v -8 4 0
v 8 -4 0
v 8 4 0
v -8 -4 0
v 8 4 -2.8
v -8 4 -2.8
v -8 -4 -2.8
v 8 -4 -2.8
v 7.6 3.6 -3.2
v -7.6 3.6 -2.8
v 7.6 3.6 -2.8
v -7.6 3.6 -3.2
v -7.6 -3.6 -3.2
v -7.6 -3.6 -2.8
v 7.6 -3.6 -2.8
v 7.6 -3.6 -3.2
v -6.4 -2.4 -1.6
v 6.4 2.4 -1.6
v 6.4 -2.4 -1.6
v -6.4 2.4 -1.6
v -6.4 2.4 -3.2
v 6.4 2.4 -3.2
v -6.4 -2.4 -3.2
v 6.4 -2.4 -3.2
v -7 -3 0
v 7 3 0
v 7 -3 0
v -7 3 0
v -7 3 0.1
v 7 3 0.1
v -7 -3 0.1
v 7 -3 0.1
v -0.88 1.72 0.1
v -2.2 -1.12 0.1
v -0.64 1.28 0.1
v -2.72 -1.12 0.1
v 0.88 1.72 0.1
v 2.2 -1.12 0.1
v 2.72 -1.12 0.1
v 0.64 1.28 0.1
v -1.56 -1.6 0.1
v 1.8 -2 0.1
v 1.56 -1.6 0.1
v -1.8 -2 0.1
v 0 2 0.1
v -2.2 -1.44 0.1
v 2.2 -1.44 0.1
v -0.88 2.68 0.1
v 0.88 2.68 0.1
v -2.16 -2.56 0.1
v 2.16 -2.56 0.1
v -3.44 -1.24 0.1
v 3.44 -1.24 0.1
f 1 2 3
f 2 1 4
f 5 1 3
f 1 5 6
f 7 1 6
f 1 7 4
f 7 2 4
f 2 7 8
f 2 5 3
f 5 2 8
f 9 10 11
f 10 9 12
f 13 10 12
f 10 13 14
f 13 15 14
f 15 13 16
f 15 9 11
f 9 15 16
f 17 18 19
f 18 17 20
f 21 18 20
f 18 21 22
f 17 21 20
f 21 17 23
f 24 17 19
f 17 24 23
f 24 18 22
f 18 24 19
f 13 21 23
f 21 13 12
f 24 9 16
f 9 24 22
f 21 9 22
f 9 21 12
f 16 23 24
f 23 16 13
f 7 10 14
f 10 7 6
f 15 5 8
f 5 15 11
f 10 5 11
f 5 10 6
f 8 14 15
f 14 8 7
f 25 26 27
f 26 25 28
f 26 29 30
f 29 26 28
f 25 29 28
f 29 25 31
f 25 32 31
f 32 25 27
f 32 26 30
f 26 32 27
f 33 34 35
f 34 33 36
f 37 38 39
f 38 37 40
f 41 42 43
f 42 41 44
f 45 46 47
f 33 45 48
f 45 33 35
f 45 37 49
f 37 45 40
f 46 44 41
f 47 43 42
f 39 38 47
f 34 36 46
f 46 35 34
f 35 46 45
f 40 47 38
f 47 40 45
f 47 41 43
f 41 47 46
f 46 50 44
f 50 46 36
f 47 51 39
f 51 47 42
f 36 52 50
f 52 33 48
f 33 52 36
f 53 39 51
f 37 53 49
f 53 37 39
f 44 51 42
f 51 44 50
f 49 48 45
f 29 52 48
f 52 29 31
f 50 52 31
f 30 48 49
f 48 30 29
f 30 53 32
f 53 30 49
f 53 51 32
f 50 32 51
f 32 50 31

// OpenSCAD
// file: ../p/box5.scad
use <../lib.scad>
function ldraw_lib__box5() = [
// 0 Box with 5 Faces and All Edges
// 0 Name: box5.dat
// 0 Author: James Jessiman
// 0 !LDRAW_ORG Primitive UPDATE 2012-01
// 0 !LICENSE Licensed under CC BY 4.0 : see CAreadme.txt
// 
// 0 BFC CERTIFY CCW
  [0,"BFC","CERTIFY"],
  [0,"BFC","CCW"],
// 
// 0 !HISTORY 2002-04-03 [sbliss] Modified for BFC compliance
// 0 !HISTORY 2002-04-25 [PTadmin] Official Update 2002-02
// 0 !HISTORY 2007-06-24 [PTadmin] Header formatted for Contributor Agreement
// 0 !HISTORY 2008-07-01 [PTadmin] Official Update 2008-01
// 0 !HISTORY 2012-02-16 [Philo] Changed to CCW
// 0 !HISTORY 2012-03-30 [PTadmin] Official Update 2012-01
// 
// 
// 2 24 1 1 1 -1 1 1
  [2,24,1,1,1,-1,1,1],
// 2 24 -1 1 1 -1 1 -1
  [2,24,-1,1,1,-1,1,-1],
// 2 24 -1 1 -1 1 1 -1
  [2,24,-1,1,-1,1,1,-1],
// 2 24 1 1 -1 1 1 1
  [2,24,1,1,-1,1,1,1],
// 2 24 1 0 1 -1 0 1
  [2,24,1,0,1,-1,0,1],
// 2 24 -1 0 1 -1 0 -1
  [2,24,-1,0,1,-1,0,-1],
// 2 24 -1 0 -1 1 0 -1
  [2,24,-1,0,-1,1,0,-1],
// 2 24 1 0 -1 1 0 1
  [2,24,1,0,-1,1,0,1],
// 2 24 1 0 1 1 1 1
  [2,24,1,0,1,1,1,1],
// 2 24 -1 0 1 -1 1 1
  [2,24,-1,0,1,-1,1,1],
// 2 24 1 0 -1 1 1 -1
  [2,24,1,0,-1,1,1,-1],
// 2 24 -1 0 -1 -1 1 -1
  [2,24,-1,0,-1,-1,1,-1],
// 4 16 -1 1 1 1 1 1 1 1 -1 -1 1 -1
  [4,16,-1,1,1,1,1,1,1,1,-1,-1,1,-1],
// 4 16 -1 1 1 -1 0 1 1 0 1 1 1 1
  [4,16,-1,1,1,-1,0,1,1,0,1,1,1,1],
// 4 16 -1 1 -1 -1 0 -1 -1 0 1 -1 1 1
  [4,16,-1,1,-1,-1,0,-1,-1,0,1,-1,1,1],
// 4 16 1 1 -1 1 0 -1 -1 0 -1 -1 1 -1
  [4,16,1,1,-1,1,0,-1,-1,0,-1,-1,1,-1],
// 4 16 1 1 1 1 0 1 1 0 -1 1 1 -1
  [4,16,1,1,1,1,0,1,1,0,-1,1,1,-1],
];
module ldraw_lib__box5(step=0, col=false, unit=2/5, alt=false, line=0.2, solid=!$preview)
    makepoly(ldraw_lib__box5(), step=step, col=col, unit=unit, alt=alt, line=line, solid=solid);
ldraw_lib__box5(line=0.2);
// file: ../p/box4.scad
use <../lib.scad>
function ldraw_lib__box4() = [
// 0 Box with 4 Faces (2 Parallel Pairs) and All Edges
// 0 Name: box4.dat
// 0 Author: James Jessiman
// 0 !LDRAW_ORG Primitive UPDATE 2012-01
// 0 !LICENSE Licensed under CC BY 4.0 : see CAreadme.txt
// 
// 0 BFC CERTIFY CCW
  [0,"BFC","CERTIFY"],
  [0,"BFC","CCW"],
// 
// 0 !HISTORY 2002-04-03 [sbliss] Modified for BFC compliance
// 0 !HISTORY 2002-04-25 [PTadmin] Official Update 2002-02
// 0 !HISTORY 2007-06-24 [PTadmin] Header formatted for Contributor Agreement
// 0 !HISTORY 2008-07-01 [PTadmin] Official Update 2008-01
// 0 !HISTORY 2012-02-16 [Philo] Changed to CCW
// 0 !HISTORY 2012-03-30 [PTadmin] Official Update 2012-01
// 
// 
// 2 24 1 1 1 -1 1 1
  [2,24,1,1,1,-1,1,1],
// 2 24 -1 1 1 -1 1 -1
  [2,24,-1,1,1,-1,1,-1],
// 2 24 -1 1 -1 1 1 -1
  [2,24,-1,1,-1,1,1,-1],
// 2 24 1 1 -1 1 1 1
  [2,24,1,1,-1,1,1,1],
// 2 24 1 0 1 -1 0 1
  [2,24,1,0,1,-1,0,1],
// 2 24 -1 0 1 -1 0 -1
  [2,24,-1,0,1,-1,0,-1],
// 2 24 -1 0 -1 1 0 -1
  [2,24,-1,0,-1,1,0,-1],
// 2 24 1 0 -1 1 0 1
  [2,24,1,0,-1,1,0,1],
// 2 24 1 0 1 1 1 1
  [2,24,1,0,1,1,1,1],
// 2 24 -1 0 1 -1 1 1
  [2,24,-1,0,1,-1,1,1],
// 2 24 1 0 -1 1 1 -1
  [2,24,1,0,-1,1,1,-1],
// 2 24 -1 0 -1 -1 1 -1
  [2,24,-1,0,-1,-1,1,-1],
// 4 16 -1 1 1 -1 0 1 1 0 1 1 1 1
  [4,16,-1,1,1,-1,0,1,1,0,1,1,1,1],
// 4 16 -1 1 -1 -1 0 -1 -1 0 1 -1 1 1
  [4,16,-1,1,-1,-1,0,-1,-1,0,1,-1,1,1],
// 4 16 1 1 -1 1 0 -1 -1 0 -1 -1 1 -1
  [4,16,1,1,-1,1,0,-1,-1,0,-1,-1,1,-1],
// 4 16 1 1 1 1 0 1 1 0 -1 1 1 -1
  [4,16,1,1,1,1,0,1,1,0,-1,1,1,-1],
];
module ldraw_lib__box4(step=0, col=false, unit=2/5, alt=false, line=0.2, solid=!$preview)
    makepoly(ldraw_lib__box4(), step=step, col=col, unit=unit, alt=alt, line=line, solid=solid);
ldraw_lib__box4(line=0.2);
// file: ../p/box5-12.scad
use <../lib.scad>
function ldraw_lib__box5_12() = [
// 0 Box with 5 Faces without Any Edges
// 0 Name: box5-12.dat
// 0 Author: Chris Dee [cwdee]
// 0 !LDRAW_ORG Primitive UPDATE 2009-02
// 0 !LICENSE Licensed under CC BY 4.0 : see CAreadme.txt
// 
// 0 BFC CERTIFY CCW
  [0,"BFC","CERTIFY"],
  [0,"BFC","CCW"],
// 
// 0 !HISTORY 2009-09-03 [PTadmin] Official Update 2009-02
// 
// 
// 4 16 1 1 1 1 1 -1 -1 1 -1 -1 1 1
  [4,16,1,1,1,1,1,-1,-1,1,-1,-1,1,1],
// 4 16 -1 0 1 1 0 1 1 1 1 -1 1 1
  [4,16,-1,0,1,1,0,1,1,1,1,-1,1,1],
// 4 16 -1 0 -1 -1 0 1 -1 1 1 -1 1 -1
  [4,16,-1,0,-1,-1,0,1,-1,1,1,-1,1,-1],
// 4 16 1 0 -1 -1 0 -1 -1 1 -1 1 1 -1
  [4,16,1,0,-1,-1,0,-1,-1,1,-1,1,1,-1],
// 4 16 1 0 1 1 0 -1 1 1 -1 1 1 1
  [4,16,1,0,1,1,0,-1,1,1,-1,1,1,1],
// 0
];
module ldraw_lib__box5_12(step=0, col=false, unit=2/5, alt=false, line=0.2, solid=!$preview)
    makepoly(ldraw_lib__box5_12(), step=step, col=col, unit=unit, alt=alt, line=line, solid=solid);
ldraw_lib__box5_12(line=0.2);
// file: s/3069bs01.scad
use <../../lib.scad>
use <../../p/box4.scad>
use <../../p/box5.scad>
function ldraw_lib__s__3069bs01() = [
// 0 ~Tile  1 x  2 with Groove without Top Face
// 0 Name: s\3069bs01.dat
// 0 Author: Santeri Piippo [arezey]
// 0 !LDRAW_ORG Subpart UPDATE 2010-02
// 0 !LICENSE Licensed under CC BY 4.0 : see CAreadme.txt
// 
// 0 BFC CERTIFY CCW
  [0,"BFC","CERTIFY"],
  [0,"BFC","CCW"],
// 
// 0 !HISTORY 2010-07-05 [PTadmin] Official Update 2010-02
// 
// 
// 1 16 0 0 0 20 0 0 0 7 0 0 0 10 box4.dat
  [1,16,0,0,0,20,0,0,0,7,0,0,0,10, ldraw_lib__box4()],
// 1 16 0 7 0 19 0 0 0 1 0 0 0 9 box4.dat
  [1,16,0,7,0,19,0,0,0,1,0,0,0,9, ldraw_lib__box4()],
// 0 BFC INVERTNEXT
  [0,"BFC","INVERTNEXT"],
// 1 16 0 8 0 16 0 0 0 -4 0 0 0 6 box5.dat
  [1,16,0,8,0,16,0,0,0,-4,0,0,0,6, ldraw_lib__box5()],
// 4 16 -19 8 9 -16 8 6 -16 8 -6 -19 8 -9
  [4,16,-19,8,9,-16,8,6,-16,8,-6,-19,8,-9],
// 4 16 19 8 -9 16 8 -6 16 8 6 19 8 9
  [4,16,19,8,-9,16,8,-6,16,8,6,19,8,9],
// 4 16 19 8 9 16 8 6 -16 8 6 -19 8 9
  [4,16,19,8,9,16,8,6,-16,8,6,-19,8,9],
// 4 16 -19 8 -9 -16 8 -6 16 8 -6 19 8 -9
  [4,16,-19,8,-9,-16,8,-6,16,8,-6,19,8,-9],
// 4 16 -20 7 10 -19 7 9 -19 7 -9 -20 7 -10
  [4,16,-20,7,10,-19,7,9,-19,7,-9,-20,7,-10],
// 4 16 20 7 -10 19 7 -9 19 7 9 20 7 10
  [4,16,20,7,-10,19,7,-9,19,7,9,20,7,10],
// 4 16 20 7 10 19 7 9 -19 7 9 -20 7 10
  [4,16,20,7,10,19,7,9,-19,7,9,-20,7,10],
// 4 16 -20 7 -10 -19 7 -9 19 7 -9 20 7 -10
  [4,16,-20,7,-10,-19,7,-9,19,7,-9,20,7,-10],
// 0 //
];
module ldraw_lib__s__3069bs01(step=0, col=false, unit=2/5, alt=false, line=0.2, solid=!$preview)
    makepoly(ldraw_lib__s__3069bs01(), step=step, col=col, unit=unit, alt=alt, line=line, solid=solid);
ldraw_lib__s__3069bs01(line=0.2);
// file: 6299663b.scad
use <../lib.scad>
use <../p/box5-12.scad>
function ldraw_lib__6299663b() = [
// 0 Sticker  0.7 x  1.7 with Red and White Triangle on Dark Red Background
// 0 Name: 6299663b.dat
// 0 Author: Evert-Jan Boer [ejboer]
// 0 !LDRAW_ORG Part UPDATE 2020-03
// 0 !LICENSE Licensed under CC BY 4.0 : see CAreadme.txt
// 
// 0 BFC CERTIFY CCW
  [0,"BFC","CERTIFY"],
  [0,"BFC","CCW"],
// 
// 0 !KEYWORDS A-wing Starfighter UCS, Set 75275
// 
// 0 !HISTORY 2020-12-29 [PTadmin] Official Update 2020-03
// 
// 
// 1 16 0 -0.25 0 17.5 0 0 0 0.25 0 0 0 7.5 box5-12.dat
  [1,16,0,-0.25,0,17.5,0,0,0,0.25,0,0,0,7.5, ldraw_lib__box5_12()],
// 
// 4 4 -6.8 -0.25 -2.8 -5.5 -0.25 -2.8 -1.6 -0.25 3.2 -2.2 -0.25 4.3
  [4,4,-6.8,-0.25,-2.8,-5.5,-0.25,-2.8,-1.6,-0.25,3.2,-2.2,-0.25,4.3],
// 4 4 1.6 -0.25 3.2 5.5 -0.25 -2.8 6.8 -0.25 -2.8 2.2 -0.25 4.3
  [4,4,1.6,-0.25,3.2,5.5,-0.25,-2.8,6.8,-0.25,-2.8,2.2,-0.25,4.3],
// 4 4 -3.9 -0.25 -4 -4.5 -0.25 -5 4.5 -0.25 -5 3.9 -0.25 -4
  [4,4,-3.9,-0.25,-4,-4.5,-0.25,-5,4.5,-0.25,-5,3.9,-0.25,-4],
// 3 4 0 -0.25 5 -5.5 -0.25 -3.6 5.5 -0.25 -3.6
  [3,4,0,-0.25,5,-5.5,-0.25,-3.6,5.5,-0.25,-3.6],
// 4 15 -2.2 -0.25 4.3 -1.6 -0.25 3.2 0 -0.25 5 -2.2 -0.25 6.7
  [4,15,-2.2,-0.25,4.3,-1.6,-0.25,3.2,0,-0.25,5,-2.2,-0.25,6.7],
// 4 15 0 -0.25 5 1.6 -0.25 3.2 2.2 -0.25 4.3 2.2 -0.25 6.7
  [4,15,0,-0.25,5,1.6,-0.25,3.2,2.2,-0.25,4.3,2.2,-0.25,6.7],
// 3 15 -5.5 -0.25 -3.6 -4.5 -0.25 -5 -3.9 -0.25 -4
  [3,15,-5.5,-0.25,-3.6,-4.5,-0.25,-5,-3.9,-0.25,-4],
// 3 15 5.5 -0.25 -3.6 3.9 -0.25 -4 4.5 -0.25 -5
  [3,15,5.5,-0.25,-3.6,3.9,-0.25,-4,4.5,-0.25,-5],
// 3 15 6.8 -0.25 -2.8 5.5 -0.25 -2.8 5.5 -0.25 -3.6
  [3,15,6.8,-0.25,-2.8,5.5,-0.25,-2.8,5.5,-0.25,-3.6],
// 3 15 -5.5 -0.25 -2.8 -6.8 -0.25 -2.8 -5.5 -0.25 -3.6
  [3,15,-5.5,-0.25,-2.8,-6.8,-0.25,-2.8,-5.5,-0.25,-3.6],
// 4 15 -1.6 -0.25 3.2 -5.5 -0.25 -2.8 -5.5 -0.25 -3.6 0 -0.25 5
  [4,15,-1.6,-0.25,3.2,-5.5,-0.25,-2.8,-5.5,-0.25,-3.6,0,-0.25,5],
// 4 15 1.6 -0.25 3.2 0 -0.25 5 5.5 -0.25 -3.6 5.5 -0.25 -2.8
  [4,15,1.6,-0.25,3.2,0,-0.25,5,5.5,-0.25,-3.6,5.5,-0.25,-2.8],
// 4 15 -5.5 -0.25 -3.6 -3.9 -0.25 -4 3.9 -0.25 -4 5.5 -0.25 -3.6
  [4,15,-5.5,-0.25,-3.6,-3.9,-0.25,-4,3.9,-0.25,-4,5.5,-0.25,-3.6],
// 4 15 -4.5 -0.25 -5 -5.5 -0.25 -3.6 -6.8 -0.25 -2.8 -5.4 -0.25 -6.4
  [4,15,-4.5,-0.25,-5,-5.5,-0.25,-3.6,-6.8,-0.25,-2.8,-5.4,-0.25,-6.4],
// 4 15 6.8 -0.25 -2.8 5.5 -0.25 -3.6 4.5 -0.25 -5 5.4 -0.25 -6.4
  [4,15,6.8,-0.25,-2.8,5.5,-0.25,-3.6,4.5,-0.25,-5,5.4,-0.25,-6.4],
// 3 15 -6.8 -0.25 -2.8 -8.6 -0.25 -3.1 -5.4 -0.25 -6.4
  [3,15,-6.8,-0.25,-2.8,-8.6,-0.25,-3.1,-5.4,-0.25,-6.4],
// 4 15 -8.6 -0.25 -3.1 -6.8 -0.25 -2.8 -2.2 -0.25 4.3 -2.2 -0.25 6.7
  [4,15,-8.6,-0.25,-3.1,-6.8,-0.25,-2.8,-2.2,-0.25,4.3,-2.2,-0.25,6.7],
// 3 15 8.6 -0.25 -3.1 6.8 -0.25 -2.8 5.4 -0.25 -6.4
  [3,15,8.6,-0.25,-3.1,6.8,-0.25,-2.8,5.4,-0.25,-6.4],
// 4 15 2.2 -0.25 4.3 6.8 -0.25 -2.8 8.6 -0.25 -3.1 2.2 -0.25 6.7
  [4,15,2.2,-0.25,4.3,6.8,-0.25,-2.8,8.6,-0.25,-3.1,2.2,-0.25,6.7],
// 4 15 -4.5 -0.25 -5 -5.4 -0.25 -6.4 5.4 -0.25 -6.4 4.5 -0.25 -5
  [4,15,-4.5,-0.25,-5,-5.4,-0.25,-6.4,5.4,-0.25,-6.4,4.5,-0.25,-5],
// 3 15 2.2 -0.25 6.7 -2.2 -0.25 6.7 0 -0.25 5
  [3,15,2.2,-0.25,6.7,-2.2,-0.25,6.7,0,-0.25,5],
// 4 320 -17.5 -0.25 7.5 -17.5 -0.25 -7.5 -8.6 -0.25 -3.1 -2.2 -0.25 6.7
  [4,320,-17.5,-0.25,7.5,-17.5,-0.25,-7.5,-8.6,-0.25,-3.1,-2.2,-0.25,6.7],
// 3 320 -5.4 -0.25 -6.4 -8.6 -0.25 -3.1 -17.5 -0.25 -7.5
  [3,320,-5.4,-0.25,-6.4,-8.6,-0.25,-3.1,-17.5,-0.25,-7.5],
// 4 320 -17.5 -0.25 7.5 -2.2 -0.25 6.7 2.2 -0.25 6.7 17.5 -0.25 7.5
  [4,320,-17.5,-0.25,7.5,-2.2,-0.25,6.7,2.2,-0.25,6.7,17.5,-0.25,7.5],
// 4 320 17.5 -0.25 7.5 2.2 -0.25 6.7 8.6 -0.25 -3.1 17.5 -0.25 -7.5
  [4,320,17.5,-0.25,7.5,2.2,-0.25,6.7,8.6,-0.25,-3.1,17.5,-0.25,-7.5],
// 3 320 8.6 -0.25 -3.1 5.4 -0.25 -6.4 17.5 -0.25 -7.5
  [3,320,8.6,-0.25,-3.1,5.4,-0.25,-6.4,17.5,-0.25,-7.5],
// 4 320 -5.4 -0.25 -6.4 -17.5 -0.25 -7.5 17.5 -0.25 -7.5 5.4 -0.25 -6.4
  [4,320,-5.4,-0.25,-6.4,-17.5,-0.25,-7.5,17.5,-0.25,-7.5,5.4,-0.25,-6.4],
];
module ldraw_lib__6299663b(step=0, col=false, unit=2/5, alt=false, line=0.2, solid=!$preview)
    makepoly(ldraw_lib__6299663b(), step=step, col=col, unit=unit, alt=alt, line=line, solid=solid);
ldraw_lib__6299663b(line=0.2);
// file: 3069b.scad
use <../lib.scad>
use <s/3069bs01.scad>
function ldraw_lib__3069b() = [
// 0 Tile  1 x  2 with Groove
// 0 Name: 3069b.dat
// 0 Author: Santeri Piippo [arezey]
// 0 !LDRAW_ORG Part UPDATE 2010-02
// 0 !LICENSE Licensed under CC BY 4.0 : see CAreadme.txt
// 
// 0 BFC CERTIFY CCW
  [0,"BFC","CERTIFY"],
  [0,"BFC","CCW"],
// 
// 0 !HISTORY 2010-07-05 [PTadmin] Official Update 2010-02
// 
// 
// 4 16 20 0 -10 20 0 10 -20 0 10 -20 0 -10
  [4,16,20,0,-10,20,0,10,-20,0,10,-20,0,-10],
// 1 16 0 0 0 1 0 0 0 1 0 0 0 1 s\3069bs01.dat
  [1,16,0,0,0,1,0,0,0,1,0,0,0,1, ldraw_lib__s__3069bs01()],
// 0 //
];
module ldraw_lib__3069b(step=0, col=false, unit=2/5, alt=false, line=0.2, solid=!$preview)
    makepoly(ldraw_lib__3069b(), step=step, col=col, unit=unit, alt=alt, line=line, solid=solid);
ldraw_lib__3069b(line=0.2);
// main file
use <../lib.scad>
use <3069b.scad>
use <6299663b.scad>
function ldraw_lib__3069bds3() = [
// 0 Tile  1 x  2 with Red and White Triangle on Dark Red Background Sticker
// 0 Name: 3069bds3.dat
// 0 Author: Evert-Jan Boer [ejboer]
// 0 !LDRAW_ORG Shortcut UPDATE 2024-10
// 0 !LICENSE Licensed under CC BY 4.0 : see CAreadme.txt
// 
// 0 BFC CERTIFY CCW
  [0,"BFC","CERTIFY"],
  [0,"BFC","CCW"],
// 
// 0 !CATEGORY Sticker Shortcut
// 0 !KEYWORDS Bricklink 3069pb1276, Set 75275
// 
// 0 !HISTORY 2024-12-01 [OrionP] Official Update 2024-10
// 
// 1 16 0 0 0 1 0 0 0 1 0 0 0 1 3069b.dat
  [1,16,0,0,0,1,0,0,0,1,0,0,0,1, ldraw_lib__3069b()],
// 1 16 0 0 0 1 0 0 0 1 0 0 0 1 6299663b.dat
  [1,16,0,0,0,1,0,0,0,1,0,0,0,1, ldraw_lib__6299663b()],
];
module ldraw_lib__3069bds3(step=0, col=false, unit=2/5, alt=false, line=0.2, solid=!$preview)
    makepoly(ldraw_lib__3069bds3(), step=step, col=col, unit=unit, alt=alt, line=line, solid=solid);
ldraw_lib__3069bds3(line=0.2);
